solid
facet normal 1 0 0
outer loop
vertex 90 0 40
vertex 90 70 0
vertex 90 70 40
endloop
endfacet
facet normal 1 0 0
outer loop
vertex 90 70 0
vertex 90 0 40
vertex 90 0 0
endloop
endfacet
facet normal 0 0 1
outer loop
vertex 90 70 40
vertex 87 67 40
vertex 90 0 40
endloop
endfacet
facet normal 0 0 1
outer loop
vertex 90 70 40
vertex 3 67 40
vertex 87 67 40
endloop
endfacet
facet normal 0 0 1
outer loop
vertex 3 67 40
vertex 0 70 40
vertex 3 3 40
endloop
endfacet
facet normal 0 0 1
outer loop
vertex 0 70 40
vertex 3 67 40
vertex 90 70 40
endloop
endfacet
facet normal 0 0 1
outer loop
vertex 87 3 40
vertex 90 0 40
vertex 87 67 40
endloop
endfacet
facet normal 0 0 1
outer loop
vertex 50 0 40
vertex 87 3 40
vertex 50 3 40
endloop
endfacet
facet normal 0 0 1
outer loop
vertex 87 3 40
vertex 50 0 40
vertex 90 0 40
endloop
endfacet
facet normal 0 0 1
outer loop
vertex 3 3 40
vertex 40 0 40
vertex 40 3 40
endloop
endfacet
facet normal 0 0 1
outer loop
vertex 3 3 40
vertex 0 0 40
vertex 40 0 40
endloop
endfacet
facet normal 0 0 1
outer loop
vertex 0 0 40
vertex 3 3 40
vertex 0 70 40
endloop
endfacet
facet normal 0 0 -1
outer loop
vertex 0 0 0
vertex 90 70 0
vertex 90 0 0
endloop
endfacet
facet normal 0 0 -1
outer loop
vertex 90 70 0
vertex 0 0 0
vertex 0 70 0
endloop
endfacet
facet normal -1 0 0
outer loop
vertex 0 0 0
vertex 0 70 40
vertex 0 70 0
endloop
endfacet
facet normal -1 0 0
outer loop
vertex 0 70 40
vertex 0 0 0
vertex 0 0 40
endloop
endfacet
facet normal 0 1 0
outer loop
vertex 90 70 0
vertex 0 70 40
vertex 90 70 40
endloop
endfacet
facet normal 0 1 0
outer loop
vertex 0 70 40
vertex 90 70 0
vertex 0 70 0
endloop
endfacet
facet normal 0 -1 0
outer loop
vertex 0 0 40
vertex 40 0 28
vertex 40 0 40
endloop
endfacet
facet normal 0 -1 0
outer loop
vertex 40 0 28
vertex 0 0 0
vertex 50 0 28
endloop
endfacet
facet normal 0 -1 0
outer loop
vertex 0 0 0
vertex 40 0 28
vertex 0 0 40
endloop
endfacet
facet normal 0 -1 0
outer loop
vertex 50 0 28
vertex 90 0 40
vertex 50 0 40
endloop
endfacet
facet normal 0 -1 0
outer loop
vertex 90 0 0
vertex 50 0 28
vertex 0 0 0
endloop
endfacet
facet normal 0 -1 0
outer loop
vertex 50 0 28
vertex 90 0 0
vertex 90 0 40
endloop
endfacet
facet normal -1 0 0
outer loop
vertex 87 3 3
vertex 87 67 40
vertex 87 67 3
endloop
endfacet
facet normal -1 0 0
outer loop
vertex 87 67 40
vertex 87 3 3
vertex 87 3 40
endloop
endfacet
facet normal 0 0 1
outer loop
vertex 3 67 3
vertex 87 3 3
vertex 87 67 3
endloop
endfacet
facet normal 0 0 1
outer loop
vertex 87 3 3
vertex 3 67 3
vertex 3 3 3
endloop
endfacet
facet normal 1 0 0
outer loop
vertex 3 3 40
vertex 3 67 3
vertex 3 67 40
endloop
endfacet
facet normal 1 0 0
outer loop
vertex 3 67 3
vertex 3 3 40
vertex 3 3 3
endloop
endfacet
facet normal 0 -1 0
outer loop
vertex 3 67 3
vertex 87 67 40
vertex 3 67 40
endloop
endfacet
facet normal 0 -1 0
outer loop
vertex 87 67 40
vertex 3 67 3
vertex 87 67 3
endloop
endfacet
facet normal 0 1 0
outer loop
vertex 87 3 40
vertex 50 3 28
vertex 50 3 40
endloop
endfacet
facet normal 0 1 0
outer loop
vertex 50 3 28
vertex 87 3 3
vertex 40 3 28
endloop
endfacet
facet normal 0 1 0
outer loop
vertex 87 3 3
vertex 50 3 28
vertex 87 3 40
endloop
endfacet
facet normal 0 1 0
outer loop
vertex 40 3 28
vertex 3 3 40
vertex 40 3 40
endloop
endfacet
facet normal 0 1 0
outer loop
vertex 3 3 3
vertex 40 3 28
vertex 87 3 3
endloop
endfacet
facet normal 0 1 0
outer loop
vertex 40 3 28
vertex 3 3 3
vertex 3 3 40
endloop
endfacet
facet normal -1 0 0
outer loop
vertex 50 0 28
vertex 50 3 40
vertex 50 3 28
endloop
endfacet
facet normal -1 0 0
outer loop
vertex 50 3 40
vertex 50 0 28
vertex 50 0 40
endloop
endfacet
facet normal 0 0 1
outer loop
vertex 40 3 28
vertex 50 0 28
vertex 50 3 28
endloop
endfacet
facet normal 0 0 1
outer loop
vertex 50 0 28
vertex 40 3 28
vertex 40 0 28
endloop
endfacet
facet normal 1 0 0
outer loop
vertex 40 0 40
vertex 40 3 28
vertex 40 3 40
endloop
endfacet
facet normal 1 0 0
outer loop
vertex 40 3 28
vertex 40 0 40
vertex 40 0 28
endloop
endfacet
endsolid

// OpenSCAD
$fn = 32;

// ----------------------------------------------------------------------
// Enclosure box: notch enclosure
// ----------------------------------------------------------------------

// --- parameters (mm) ---
box_l = 90;               // outer length, X
box_w = 70;               // outer width, Y
box_h = 40;               // outer height
wall_t = 3;               // wall thickness
notch_w = 10;             // cable notch width
notch_h = 12;             // cable notch height

inner_h = box_h - wall_t;  // cavity depth
boss_h = inner_h - 2;  // corner boss height

difference() {
  union() {
    difference() {
      cube([box_l, box_w, box_h]);
      translate([wall_t, wall_t, wall_t])
        cube([box_l - 2 * wall_t, box_w - 2 * wall_t, box_h]);
    }
  }
  translate([box_l / 2 - notch_w / 2, -1, box_h - notch_h])
    cube([notch_w, wall_t + 2, notch_h + 1]);
}
